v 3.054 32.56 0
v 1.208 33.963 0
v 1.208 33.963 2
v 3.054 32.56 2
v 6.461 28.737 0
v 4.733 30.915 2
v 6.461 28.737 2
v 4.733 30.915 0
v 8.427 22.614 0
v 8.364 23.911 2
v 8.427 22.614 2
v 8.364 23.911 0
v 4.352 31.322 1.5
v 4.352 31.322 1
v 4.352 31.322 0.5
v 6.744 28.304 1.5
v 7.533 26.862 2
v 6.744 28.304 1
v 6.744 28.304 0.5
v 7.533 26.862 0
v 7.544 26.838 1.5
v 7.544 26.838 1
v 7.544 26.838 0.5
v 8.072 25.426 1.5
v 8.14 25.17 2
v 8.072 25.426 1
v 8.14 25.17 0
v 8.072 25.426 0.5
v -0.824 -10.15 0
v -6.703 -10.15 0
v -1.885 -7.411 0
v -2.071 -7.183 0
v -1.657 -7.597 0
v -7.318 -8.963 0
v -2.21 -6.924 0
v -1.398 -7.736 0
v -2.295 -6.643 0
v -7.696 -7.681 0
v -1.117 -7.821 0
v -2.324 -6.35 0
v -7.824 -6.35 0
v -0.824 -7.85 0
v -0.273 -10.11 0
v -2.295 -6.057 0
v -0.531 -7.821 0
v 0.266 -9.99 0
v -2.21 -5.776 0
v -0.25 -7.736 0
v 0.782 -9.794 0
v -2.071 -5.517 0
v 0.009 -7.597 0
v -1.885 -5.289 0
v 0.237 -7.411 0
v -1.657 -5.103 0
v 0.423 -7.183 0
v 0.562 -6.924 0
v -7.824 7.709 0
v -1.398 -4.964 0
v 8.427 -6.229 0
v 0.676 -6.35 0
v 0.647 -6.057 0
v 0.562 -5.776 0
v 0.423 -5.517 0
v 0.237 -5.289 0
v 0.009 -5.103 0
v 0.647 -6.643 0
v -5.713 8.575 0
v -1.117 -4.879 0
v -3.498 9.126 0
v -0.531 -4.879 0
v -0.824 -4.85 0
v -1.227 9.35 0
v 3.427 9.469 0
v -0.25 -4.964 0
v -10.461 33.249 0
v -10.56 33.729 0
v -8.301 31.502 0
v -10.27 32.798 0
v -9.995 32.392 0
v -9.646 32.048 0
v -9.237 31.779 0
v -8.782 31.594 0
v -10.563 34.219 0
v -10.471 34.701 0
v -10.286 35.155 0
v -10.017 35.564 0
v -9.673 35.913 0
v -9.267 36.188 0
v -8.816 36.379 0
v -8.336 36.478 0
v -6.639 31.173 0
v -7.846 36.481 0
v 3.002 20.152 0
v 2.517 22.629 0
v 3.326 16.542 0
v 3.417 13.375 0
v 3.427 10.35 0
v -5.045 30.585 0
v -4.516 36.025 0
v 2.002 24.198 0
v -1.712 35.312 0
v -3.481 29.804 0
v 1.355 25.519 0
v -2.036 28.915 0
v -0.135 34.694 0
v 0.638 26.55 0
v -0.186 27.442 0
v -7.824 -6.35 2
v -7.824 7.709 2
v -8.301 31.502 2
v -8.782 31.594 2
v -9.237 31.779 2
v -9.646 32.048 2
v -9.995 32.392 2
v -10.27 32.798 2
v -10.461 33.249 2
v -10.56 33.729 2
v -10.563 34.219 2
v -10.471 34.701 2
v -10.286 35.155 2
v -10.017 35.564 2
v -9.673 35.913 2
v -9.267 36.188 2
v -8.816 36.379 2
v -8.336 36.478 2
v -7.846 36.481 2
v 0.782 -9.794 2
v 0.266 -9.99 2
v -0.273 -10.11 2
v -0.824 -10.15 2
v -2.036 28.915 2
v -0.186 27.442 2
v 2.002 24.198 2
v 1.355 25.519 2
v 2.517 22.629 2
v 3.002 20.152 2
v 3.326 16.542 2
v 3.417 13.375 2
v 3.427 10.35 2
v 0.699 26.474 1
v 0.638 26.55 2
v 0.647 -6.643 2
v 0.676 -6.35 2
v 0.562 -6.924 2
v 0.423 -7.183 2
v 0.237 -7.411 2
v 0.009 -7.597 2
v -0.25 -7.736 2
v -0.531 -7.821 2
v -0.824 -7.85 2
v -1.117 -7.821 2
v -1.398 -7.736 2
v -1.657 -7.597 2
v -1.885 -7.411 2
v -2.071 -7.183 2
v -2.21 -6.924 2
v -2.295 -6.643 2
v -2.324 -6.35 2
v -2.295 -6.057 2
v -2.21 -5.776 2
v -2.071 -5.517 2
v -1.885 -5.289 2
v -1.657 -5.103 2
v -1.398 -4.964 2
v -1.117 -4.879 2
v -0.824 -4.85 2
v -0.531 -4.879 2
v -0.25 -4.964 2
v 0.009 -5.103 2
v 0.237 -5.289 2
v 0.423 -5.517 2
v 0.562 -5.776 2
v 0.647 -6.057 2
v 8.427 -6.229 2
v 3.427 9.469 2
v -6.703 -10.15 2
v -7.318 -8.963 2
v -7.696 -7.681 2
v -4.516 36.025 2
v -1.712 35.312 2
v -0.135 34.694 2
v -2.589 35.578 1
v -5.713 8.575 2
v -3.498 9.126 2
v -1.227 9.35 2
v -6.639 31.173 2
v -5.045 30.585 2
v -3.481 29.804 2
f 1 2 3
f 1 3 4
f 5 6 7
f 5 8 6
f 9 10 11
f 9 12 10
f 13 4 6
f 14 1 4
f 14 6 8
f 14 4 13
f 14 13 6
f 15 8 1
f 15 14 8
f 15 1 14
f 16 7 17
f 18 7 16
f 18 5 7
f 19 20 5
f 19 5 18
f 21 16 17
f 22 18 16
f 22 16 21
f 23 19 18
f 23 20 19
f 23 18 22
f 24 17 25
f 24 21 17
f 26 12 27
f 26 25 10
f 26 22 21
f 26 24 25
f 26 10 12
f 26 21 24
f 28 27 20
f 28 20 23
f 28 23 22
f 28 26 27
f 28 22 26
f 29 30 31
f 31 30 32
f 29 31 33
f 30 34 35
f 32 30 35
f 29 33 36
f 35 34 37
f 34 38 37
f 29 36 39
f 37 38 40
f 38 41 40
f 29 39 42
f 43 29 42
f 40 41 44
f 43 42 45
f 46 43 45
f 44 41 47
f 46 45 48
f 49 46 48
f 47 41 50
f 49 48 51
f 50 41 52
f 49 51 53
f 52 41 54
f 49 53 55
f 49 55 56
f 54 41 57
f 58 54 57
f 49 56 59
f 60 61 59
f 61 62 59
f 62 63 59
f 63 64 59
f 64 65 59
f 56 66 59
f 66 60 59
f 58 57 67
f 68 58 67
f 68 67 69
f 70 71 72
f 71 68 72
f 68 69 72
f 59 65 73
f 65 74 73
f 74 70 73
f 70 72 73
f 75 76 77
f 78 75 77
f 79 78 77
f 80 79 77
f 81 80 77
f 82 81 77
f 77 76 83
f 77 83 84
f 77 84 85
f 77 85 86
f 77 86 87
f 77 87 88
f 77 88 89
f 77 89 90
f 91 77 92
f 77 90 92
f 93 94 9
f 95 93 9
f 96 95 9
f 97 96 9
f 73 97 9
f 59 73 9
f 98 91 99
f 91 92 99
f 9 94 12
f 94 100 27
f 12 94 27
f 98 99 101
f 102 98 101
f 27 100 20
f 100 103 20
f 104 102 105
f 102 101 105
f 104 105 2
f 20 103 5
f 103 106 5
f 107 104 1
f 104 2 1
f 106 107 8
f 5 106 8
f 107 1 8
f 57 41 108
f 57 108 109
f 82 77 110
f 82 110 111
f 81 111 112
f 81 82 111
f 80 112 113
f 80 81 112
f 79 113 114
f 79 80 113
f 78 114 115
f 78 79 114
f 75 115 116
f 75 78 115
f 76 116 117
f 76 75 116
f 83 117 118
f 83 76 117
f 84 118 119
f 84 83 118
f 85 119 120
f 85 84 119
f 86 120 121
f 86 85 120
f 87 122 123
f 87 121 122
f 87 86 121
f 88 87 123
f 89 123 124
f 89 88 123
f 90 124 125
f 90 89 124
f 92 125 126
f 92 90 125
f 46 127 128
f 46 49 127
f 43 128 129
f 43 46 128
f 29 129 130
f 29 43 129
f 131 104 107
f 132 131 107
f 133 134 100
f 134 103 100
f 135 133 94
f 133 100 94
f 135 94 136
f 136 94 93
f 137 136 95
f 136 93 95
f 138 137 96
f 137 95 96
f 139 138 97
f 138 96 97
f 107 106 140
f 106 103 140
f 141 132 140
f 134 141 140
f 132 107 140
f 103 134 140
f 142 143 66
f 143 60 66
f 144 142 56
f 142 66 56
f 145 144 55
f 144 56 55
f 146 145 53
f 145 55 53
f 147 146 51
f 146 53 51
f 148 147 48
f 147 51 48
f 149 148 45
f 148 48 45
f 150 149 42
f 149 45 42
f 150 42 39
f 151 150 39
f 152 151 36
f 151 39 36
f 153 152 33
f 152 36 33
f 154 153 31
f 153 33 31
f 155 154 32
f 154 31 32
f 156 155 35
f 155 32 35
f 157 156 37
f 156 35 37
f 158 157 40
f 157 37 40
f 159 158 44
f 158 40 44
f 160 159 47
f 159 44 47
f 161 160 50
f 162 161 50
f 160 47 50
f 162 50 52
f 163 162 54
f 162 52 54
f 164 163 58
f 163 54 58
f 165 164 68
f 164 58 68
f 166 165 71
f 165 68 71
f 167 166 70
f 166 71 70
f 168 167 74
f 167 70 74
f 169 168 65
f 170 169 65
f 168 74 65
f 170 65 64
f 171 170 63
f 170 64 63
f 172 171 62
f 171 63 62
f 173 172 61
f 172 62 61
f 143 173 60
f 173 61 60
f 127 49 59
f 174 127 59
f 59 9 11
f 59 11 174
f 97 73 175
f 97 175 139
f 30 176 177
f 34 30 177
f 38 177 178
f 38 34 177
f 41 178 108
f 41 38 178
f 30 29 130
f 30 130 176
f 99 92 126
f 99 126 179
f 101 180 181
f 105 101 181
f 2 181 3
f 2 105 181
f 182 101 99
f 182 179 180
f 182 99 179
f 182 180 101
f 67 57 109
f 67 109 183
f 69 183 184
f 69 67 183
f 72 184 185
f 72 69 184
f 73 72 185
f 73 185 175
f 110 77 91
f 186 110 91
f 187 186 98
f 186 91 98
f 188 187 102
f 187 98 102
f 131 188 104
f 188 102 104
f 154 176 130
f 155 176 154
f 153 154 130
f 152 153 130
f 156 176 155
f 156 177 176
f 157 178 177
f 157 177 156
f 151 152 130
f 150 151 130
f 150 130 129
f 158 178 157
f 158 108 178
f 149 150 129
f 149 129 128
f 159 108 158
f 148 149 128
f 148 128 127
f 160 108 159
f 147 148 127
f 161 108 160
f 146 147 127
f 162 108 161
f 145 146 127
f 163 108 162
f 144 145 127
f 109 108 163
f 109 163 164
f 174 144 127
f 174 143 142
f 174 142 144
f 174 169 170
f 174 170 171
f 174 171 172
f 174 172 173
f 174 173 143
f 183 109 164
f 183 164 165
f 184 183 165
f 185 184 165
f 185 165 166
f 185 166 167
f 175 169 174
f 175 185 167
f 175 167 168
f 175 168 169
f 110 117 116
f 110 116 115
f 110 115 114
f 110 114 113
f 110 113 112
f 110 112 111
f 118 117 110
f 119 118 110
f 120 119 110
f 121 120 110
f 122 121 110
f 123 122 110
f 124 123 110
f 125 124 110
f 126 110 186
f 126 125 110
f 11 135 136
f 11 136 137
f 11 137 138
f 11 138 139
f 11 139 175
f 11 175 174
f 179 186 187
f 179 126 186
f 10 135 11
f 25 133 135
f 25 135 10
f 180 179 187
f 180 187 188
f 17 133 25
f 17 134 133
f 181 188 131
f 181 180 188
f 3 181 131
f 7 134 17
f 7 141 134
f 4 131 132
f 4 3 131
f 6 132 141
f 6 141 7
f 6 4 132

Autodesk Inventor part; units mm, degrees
ref_plane "YZ Plane" through (0, 0, 0) normal (1, 0, 0) x (0, 1, 0)
ref_plane "XZ Plane" through (0, 0, 0) normal (0, 1, 0) x (-1, 0, 0)
ref_plane "XY Plane" through (0, 0, 0) normal (0, 0, 1) x (1, 0, 0)
sketch "Эскиз1" plane through (0, 0, 0) normal (0, 0, 1) x (1, 0, 0)
  line L0 (8.4266, -12.65) -> (-2.5734, -12.65)
  line L1 (-2.5734, -12.65) -> (-2.5734, -47.65)
  line L2 (-2.5734, -47.65) -> (8.4266, -47.65)
  line L3 (8.4266, -47.65) -> (8.4266, -82.9136)
  spline S0 degree 4 poles (2.3773, -93.423) (5.3243, -91.0921) (7.8605, -87.681) (8.4266, -85.6037) (8.4266, -82.9136) knots 0.089011 0.089011 0.089011 0.089011 0.089011 1 1 1 1 1
  spline S1 degree 4 poles (1.3465, -94.1725) (1.6324, -93.9967) (1.8997, -93.813) (2.1479, -93.6217) (2.3773, -93.423) knots 0 0 0 0 0 1 1 1 1 1
  spline S2 degree 4 poles (1.2081, -94.2627) (1.2427, -94.2405) (1.2773, -94.218) (1.3119, -94.1954) (1.3465, -94.1725) knots 0 0 0 0 0 1 1 1 1 1
  spline S3 degree 2 poles (-15.5734, -96.9447) (-3.5967, -97.3511) (1.2081, -94.2627) knots 0 0 0 0.59566 0.59566 0.59566
  line L4 (-125.5734, -96.9447) -> (-15.5734, -96.9447)
  spline S4 degree 2 poles (-125.5734, -96.9447) (-137.55, -97.3511) (-142.3548, -94.2627) knots 0 0 0 0.59566 0.59566 0.59566
  spline S5 degree 4 poles (-142.3548, -94.2627) (-145.6699, -92.132) (-148.8913, -88.0811) (-149.5734, -85.8665) (-149.5734, -82.9136) knots 0 0 0 0 0 1 1 1 1 1
  line L5 (-149.5734, -82.9136) -> (-149.5734, -35.15)
  spline S6 degree 2 poles (-125.5734, 36.6447) (-137.55, 37.0511) (-142.3548, 33.9627) knots 0 0 0 0.59566 0.59566 0.59566
  line L6 (-15.5734, 36.6447) -> (-125.5734, 36.6447)
  spline S7 degree 2 poles (-15.5734, 36.6447) (-3.5967, 37.0511) (1.2081, 33.9627) knots 0 0 0 0.59566 0.59566 0.59566
  spline S8 degree 4 poles (1.2081, 33.9627) (4.5231, 31.832) (7.7445, 27.7811) (8.4266, 25.5665) (8.4266, 22.6136) knots 0 0 0 0 0 1 1 1 1 1
  line L7 (8.4266, 22.6136) -> (8.4266, -12.65)
  line L8 (-10.5734, -92.9447) -> (-10.5734, 32.6447)
  line L9 (-10.5734, 32.6447) -> (-130.5734, 32.6447)
  line L10 (-130.5734, 32.6447) -> (-130.5734, -92.9447)
  line L11 (-130.5734, -92.9447) -> (-10.5734, -92.9447)
  line L12 (5.7794, 10.35) -> (5.7794, -10.35)
  line L13 (-8.4266, 10.35) -> (5.7794, 10.35)
  line L14 (-8.4266, -10.35) -> (-8.4266, 10.35)
  line L15 (5.7794, -10.35) -> (-8.4266, -10.35)
  circle A0 centre (-0.824, -6.35) radius 2.1
  line L16 (-10.5734, 32.6447) -> (-10.5734, -92.9447)
  line L17 (-10.5734, -92.9447) -> (-130.5734, -92.9447)
  line L18 (-130.5734, -92.9447) -> (-130.5734, 32.6447)
  line L19 (-130.5734, 32.6447) -> (-10.5734, 32.6447)
  line L20 (8.4266, -47.65) -> (-2.5734, -47.65)
  line L21 (-2.5734, -47.65) -> (-2.5734, -12.65)
  line L22 (-2.5734, -12.65) -> (8.4266, -12.65)
  line L23 (8.4266, 22.6136) -> (8.4266, -12.65)
  spline S9 degree 4 poles (1.2081, 33.9627) (4.5231, 31.832) (7.7445, 27.7811) (8.4266, 25.5665) (8.4266, 22.6136) knots 0 0 0 0 0 1 1 1 1 1
  spline S10 degree 2 poles (-15.5734, 36.6447) (-3.5967, 37.0511) (1.2081, 33.9627) knots 0 0 0 0.59566 0.59566 0.59566
  line L24 (-125.5734, 36.6447) -> (-15.5734, 36.6447)
  spline S11 degree 2 poles (-142.3548, 33.9627) (-137.55, 37.0511) (-125.5734, 36.6447) knots -0.59566 -0.59566 -0.59566 0 0 0
  spline S12 degree 4 poles (-142.3548, 33.9627) (-145.6699, 31.832) (-148.8913, 27.7811) (-149.5734, 25.5665) (-149.5734, 22.6136) knots 0 0 0 0 0 1 1 1 1 1
  line L25 (-149.5734, 22.6136) -> (-149.5734, -25.15)
  spline S13 degree 2 poles (-125.5734, -96.9447) (-137.55, -97.3511) (-142.3548, -94.2627) knots 0 0 0 0.59566 0.59566 0.59566
  line L26 (-15.5734, -96.9447) -> (-125.5734, -96.9447)
  spline S14 degree 2 poles (-15.5734, -96.9447) (-3.5967, -97.3511) (1.2081, -94.2627) knots 0 0 0 0.59566 0.59566 0.59566
  spline S15 degree 4 poles (1.2081, -94.2627) (1.2427, -94.2405) (1.2773, -94.218) (1.3119, -94.1954) (1.3465, -94.1725) knots 0 0 0 0 0 1 1 1 1 1
  spline S16 degree 4 poles (2.3773, -93.423) (2.1479, -93.6217) (1.8997, -93.813) (1.6324, -93.9967) (1.3465, -94.1725) knots 0 0 0 0 0 1 1 1 1 1
  spline S17 degree 4 poles (2.3773, -93.423) (5.3243, -91.0921) (7.8605, -87.681) (8.4266, -85.6037) (8.4266, -82.9136) knots 0.089011 0.089011 0.089011 0.089011 0.089011 1 1 1 1 1
  line L27 (8.4266, -47.65) -> (8.4266, -82.9136)
  circle A1 centre (-0.824, -6.35) radius 3.8
  line L28 (-0.824, -6.35) -> (0.782, -9.794)
  line L29 (0.782, -9.794) -> (8.4266, -6.2292)
  line L30 (-0.824, -6.35) -> (-0.824, -10.35)
  circle A2 centre (-8.0734, 33.9917) radius 2.5
  line L31 (-8.0734, 33.9917) -> (-7.8457, 36.4813)
  spline S18 degree 4 poles (-8.3011, 31.5021) (-5.572, 31.2525) (-0.0854, 27.7372) (3.5121, 26.3853) (3.4266, 14.7728) (3.4266, 10.35) knots 0 0 0 0 0 0.467272 1 1 1 1 1
  line L32 (8.4266, 10.35) -> (3.4266, 10.35)
  line L33 (-7.8457, 36.4813) -> (-8.3011, 31.5021)
  line L34 (-2.0361, 28.9154) -> (1.2081, 33.9627)
  line L35 (-0.824, -10.15) -> (-7.824, -10.15)
  line L36 (-7.824, -10.15) -> (-7.824, 7.7089)
  line L37 (-7.824, 7.7089) -> (3.4266, 7.7089)
  line L38 (3.4266, 7.7089) -> (3.4266, 10.35)
  line L39 (-8.7741, -6.8356) -> (-1.2266, 9.35)
  line L40 (-8.7741, -6.8356) -> (-2.4299, -9.794)
  line L41 (-1.2266, 9.35) -> (4.6043, 6.631)
  circle A3 centre (-0.824, -6.35) radius 7
  circle A4 centre (-0.824, -6.35) radius 15.7052
  line L42 (-1.2266, 9.35) -> (3.4266, 9.4693)
  circle A5 centre (-0.824, -6.35) radius 1.5
  line L43 (-138.5734, -25.15) -> (-149.5734, -25.15)
  line L44 (-149.5734, -25.15) -> (-149.5734, 22.6136)
  line L45 (-149.5734, -35.15) -> (-138.5734, -35.15)
  line L46 (-138.5734, -35.15) -> (-138.5734, -25.15)
  line L47 (-149.5734, -25.15) -> (-138.5734, -25.15)
  line L48 (-138.5734, -25.15) -> (-138.5734, -35.15)
  line L49 (-138.5734, -35.15) -> (-149.5734, -35.15)
  line L50 (-149.5734, -35.15) -> (-149.5734, -82.9136)
  line L51 (-9.8234, -70.25) -> (-9.8234, -63.25)
  line L52 (-9.8234, -63.25) -> (4.1266, -63.25)
  line L53 (4.1266, -63.25) -> (4.1266, -70.25)
  line L54 (4.1266, -70.25) -> (-9.8234, -70.25)
  line L55 (-9.9734, 2.95) -> (-9.9734, 9.95)
  line L56 (-9.9734, 9.95) -> (4.1266, 9.95)
  line L57 (4.1266, 9.95) -> (4.1266, 2.95)
  line L58 (4.1266, 2.95) -> (-9.9734, 2.95)
  line L59 (-9.8234, -63.25) -> (-9.8234, -70.25)
  line L60 (-9.8234, -70.25) -> (4.1266, -70.25)
  line L61 (4.1266, -70.25) -> (4.1266, -63.25)
  line L62 (4.1266, -63.25) -> (-9.8234, -63.25)
  line L63 (-9.9734, 9.95) -> (-9.9734, 2.95)
  line L64 (-9.9734, 2.95) -> (4.1266, 2.95)
  line L65 (4.1266, 2.95) -> (4.1266, 9.95)
  line L66 (4.1266, 9.95) -> (-9.9734, 9.95)
  spline S19 degree 4 poles (-142.3548, -94.2627) (-145.6699, -92.132) (-148.8913, -88.0811) (-149.5734, -85.8665) (-149.5734, -82.9136) knots 0 0 0 0 0 1 1 1 1 1
  spline S20 degree 4 poles (-142.3548, 33.9627) (-145.6699, 31.832) (-148.8913, 27.7811) (-149.5734, 25.5665) (-149.5734, 22.6136) knots 0 0 0 0 0 1 1 1 1 1
  point P0 (0, 0)
  point P1 (1.9242, 24.3867)
  point P2 (3.4266, 9.35)
  point P3 (-6.5685, -10.35)
  point P4 (5.7794, -8.6727)
  point P5 (6.11, -7.3095)
  point P6 (-7.886, 36.4854)
  point P7 (-7.824, -6.35)
  point P8 (-6.7027, -10.15)
  point P9 (-7.8466, 36.4837)
  point P10 (1.2103, 33.9674)
  point P11 (-7.8461, 36.4827)
  point P12 (1.2099, 33.9666)
  point P13 (-7.8465, 36.4834)
  point P14 (-7.8062, 36.4797)
  point P15 (1.2097, 33.9661)
  point P16 (-7.8463, 36.4828)
  point P17 (-7.8061, 36.4794)
  point P18 (1.2094, 33.9656)
  point P19 (-7.8462, 36.4824)
  point P20 (-7.846, 36.4824)
  point P21 (-7.8462, 36.4824)
  point P22 (1.2092, 33.9651)
  point P23 (-7.8457, 36.4813)
  point P24 (1.2089, 33.9645)
  point P25 (-7.8461, 36.4821)
  point P26 (-7.8058, 36.4784)
  point P27 (1.2087, 33.964)
  point P28 (-7.8458, 36.4813)
  point P29 (-7.8057, 36.4781)
  point P30 (1.2085, 33.9635)
  point P31 (-7.8458, 36.4813)
  point P32 (-7.8457, 36.4813)
  dimension "d0" = 7.6
  dimension "d1" = 25
  dimension "d2" = 5
  dimension "d3" = 5
  dimension "d4" = 6
  dimension "d6" = 7
  dimension "d7" = 25
  dimension "d8" = 7
  dimension "d9" = 1
  dimension "d13" = 3
extrude "Выдавливание1" add sketch "Эскиз1" along normal blind 2 contours L29 A3 L12 A4 L7 | A4 L12 L32 L7 | L29 L12 A3 | L32 L13 S18 L34 S8 L7 | A4 L57 L56 L38 L13 L12 | L12 A3 L39 L58 L57 A4 | L29 A1 L40 A3 L12 | A3 L40 A1 L35 | L30 A0 L28 A1 | A1 L28 A0 L30 | L57 L41 L37 L38 A4 | A4 L38 L56 L57 | L30 A5 L28 A0 | A0 L28 A5 L30 | L34 S18 A2 S7 | A3 L36 L39 | L39 L36 L58 | A4 L42 L38 | L38 L37 L41 A4 | L57 L58 L39 L37 L41 | L31 L33 A2 | A2 L33 L31 | L58 L36 L37 L39 | L41 L37 L39 | L39 L37 A4 picked at (5.8525, -5.4253)
sketch "Эскиз2" plane through (0, 0, 2) normal (0, 0, 1) x (1, 0, 0)
  line L0 (8.4266, -6.2292) -> (8.4266, 22.6136) projected
  line L1 (0.782, -9.794) -> (8.4266, -6.2292) projected
  arc A0 (-0.824, -10.15) -> (0.782, -9.794) centre (-0.824, -6.35) ccw projected
  line L2 (-6.7027, -10.15) -> (-0.824, -10.15) projected
  arc A1 (-7.824, -6.35) -> (-6.7027, -10.15) centre (-0.824, -6.35) ccw projected
  line L3 (-7.824, 7.7089) -> (-7.824, -6.35) projected
  arc A2 (-1.2266, 9.35) -> (-7.824, 7.7089) centre (-0.824, -6.35) ccw projected
  line L4 (3.4266, 9.4693) -> (-1.2266, 9.35) projected
  line L5 (3.4266, 10.35) -> (3.4266, 9.4693) projected
  arc A3 (-7.8457, 36.4813) -> (-8.3011, 31.5021) centre (-8.0734, 33.9917) ccw projected
  circle A4 centre (-0.824, -6.35) radius 1.5 projected
  circle A5 centre (-0.824, -6.35) radius 43.4879
  arc A6 (-7.8458, 36.4818) -> (-8.3011, 31.5021) centre (-8.0734, 33.9917) ccw projected
  point P0 (0, 0)
  point P1 (-7.8466, 36.4842)
  point P2 (-7.8463, 36.4831)
properties part number "limit_arm"
